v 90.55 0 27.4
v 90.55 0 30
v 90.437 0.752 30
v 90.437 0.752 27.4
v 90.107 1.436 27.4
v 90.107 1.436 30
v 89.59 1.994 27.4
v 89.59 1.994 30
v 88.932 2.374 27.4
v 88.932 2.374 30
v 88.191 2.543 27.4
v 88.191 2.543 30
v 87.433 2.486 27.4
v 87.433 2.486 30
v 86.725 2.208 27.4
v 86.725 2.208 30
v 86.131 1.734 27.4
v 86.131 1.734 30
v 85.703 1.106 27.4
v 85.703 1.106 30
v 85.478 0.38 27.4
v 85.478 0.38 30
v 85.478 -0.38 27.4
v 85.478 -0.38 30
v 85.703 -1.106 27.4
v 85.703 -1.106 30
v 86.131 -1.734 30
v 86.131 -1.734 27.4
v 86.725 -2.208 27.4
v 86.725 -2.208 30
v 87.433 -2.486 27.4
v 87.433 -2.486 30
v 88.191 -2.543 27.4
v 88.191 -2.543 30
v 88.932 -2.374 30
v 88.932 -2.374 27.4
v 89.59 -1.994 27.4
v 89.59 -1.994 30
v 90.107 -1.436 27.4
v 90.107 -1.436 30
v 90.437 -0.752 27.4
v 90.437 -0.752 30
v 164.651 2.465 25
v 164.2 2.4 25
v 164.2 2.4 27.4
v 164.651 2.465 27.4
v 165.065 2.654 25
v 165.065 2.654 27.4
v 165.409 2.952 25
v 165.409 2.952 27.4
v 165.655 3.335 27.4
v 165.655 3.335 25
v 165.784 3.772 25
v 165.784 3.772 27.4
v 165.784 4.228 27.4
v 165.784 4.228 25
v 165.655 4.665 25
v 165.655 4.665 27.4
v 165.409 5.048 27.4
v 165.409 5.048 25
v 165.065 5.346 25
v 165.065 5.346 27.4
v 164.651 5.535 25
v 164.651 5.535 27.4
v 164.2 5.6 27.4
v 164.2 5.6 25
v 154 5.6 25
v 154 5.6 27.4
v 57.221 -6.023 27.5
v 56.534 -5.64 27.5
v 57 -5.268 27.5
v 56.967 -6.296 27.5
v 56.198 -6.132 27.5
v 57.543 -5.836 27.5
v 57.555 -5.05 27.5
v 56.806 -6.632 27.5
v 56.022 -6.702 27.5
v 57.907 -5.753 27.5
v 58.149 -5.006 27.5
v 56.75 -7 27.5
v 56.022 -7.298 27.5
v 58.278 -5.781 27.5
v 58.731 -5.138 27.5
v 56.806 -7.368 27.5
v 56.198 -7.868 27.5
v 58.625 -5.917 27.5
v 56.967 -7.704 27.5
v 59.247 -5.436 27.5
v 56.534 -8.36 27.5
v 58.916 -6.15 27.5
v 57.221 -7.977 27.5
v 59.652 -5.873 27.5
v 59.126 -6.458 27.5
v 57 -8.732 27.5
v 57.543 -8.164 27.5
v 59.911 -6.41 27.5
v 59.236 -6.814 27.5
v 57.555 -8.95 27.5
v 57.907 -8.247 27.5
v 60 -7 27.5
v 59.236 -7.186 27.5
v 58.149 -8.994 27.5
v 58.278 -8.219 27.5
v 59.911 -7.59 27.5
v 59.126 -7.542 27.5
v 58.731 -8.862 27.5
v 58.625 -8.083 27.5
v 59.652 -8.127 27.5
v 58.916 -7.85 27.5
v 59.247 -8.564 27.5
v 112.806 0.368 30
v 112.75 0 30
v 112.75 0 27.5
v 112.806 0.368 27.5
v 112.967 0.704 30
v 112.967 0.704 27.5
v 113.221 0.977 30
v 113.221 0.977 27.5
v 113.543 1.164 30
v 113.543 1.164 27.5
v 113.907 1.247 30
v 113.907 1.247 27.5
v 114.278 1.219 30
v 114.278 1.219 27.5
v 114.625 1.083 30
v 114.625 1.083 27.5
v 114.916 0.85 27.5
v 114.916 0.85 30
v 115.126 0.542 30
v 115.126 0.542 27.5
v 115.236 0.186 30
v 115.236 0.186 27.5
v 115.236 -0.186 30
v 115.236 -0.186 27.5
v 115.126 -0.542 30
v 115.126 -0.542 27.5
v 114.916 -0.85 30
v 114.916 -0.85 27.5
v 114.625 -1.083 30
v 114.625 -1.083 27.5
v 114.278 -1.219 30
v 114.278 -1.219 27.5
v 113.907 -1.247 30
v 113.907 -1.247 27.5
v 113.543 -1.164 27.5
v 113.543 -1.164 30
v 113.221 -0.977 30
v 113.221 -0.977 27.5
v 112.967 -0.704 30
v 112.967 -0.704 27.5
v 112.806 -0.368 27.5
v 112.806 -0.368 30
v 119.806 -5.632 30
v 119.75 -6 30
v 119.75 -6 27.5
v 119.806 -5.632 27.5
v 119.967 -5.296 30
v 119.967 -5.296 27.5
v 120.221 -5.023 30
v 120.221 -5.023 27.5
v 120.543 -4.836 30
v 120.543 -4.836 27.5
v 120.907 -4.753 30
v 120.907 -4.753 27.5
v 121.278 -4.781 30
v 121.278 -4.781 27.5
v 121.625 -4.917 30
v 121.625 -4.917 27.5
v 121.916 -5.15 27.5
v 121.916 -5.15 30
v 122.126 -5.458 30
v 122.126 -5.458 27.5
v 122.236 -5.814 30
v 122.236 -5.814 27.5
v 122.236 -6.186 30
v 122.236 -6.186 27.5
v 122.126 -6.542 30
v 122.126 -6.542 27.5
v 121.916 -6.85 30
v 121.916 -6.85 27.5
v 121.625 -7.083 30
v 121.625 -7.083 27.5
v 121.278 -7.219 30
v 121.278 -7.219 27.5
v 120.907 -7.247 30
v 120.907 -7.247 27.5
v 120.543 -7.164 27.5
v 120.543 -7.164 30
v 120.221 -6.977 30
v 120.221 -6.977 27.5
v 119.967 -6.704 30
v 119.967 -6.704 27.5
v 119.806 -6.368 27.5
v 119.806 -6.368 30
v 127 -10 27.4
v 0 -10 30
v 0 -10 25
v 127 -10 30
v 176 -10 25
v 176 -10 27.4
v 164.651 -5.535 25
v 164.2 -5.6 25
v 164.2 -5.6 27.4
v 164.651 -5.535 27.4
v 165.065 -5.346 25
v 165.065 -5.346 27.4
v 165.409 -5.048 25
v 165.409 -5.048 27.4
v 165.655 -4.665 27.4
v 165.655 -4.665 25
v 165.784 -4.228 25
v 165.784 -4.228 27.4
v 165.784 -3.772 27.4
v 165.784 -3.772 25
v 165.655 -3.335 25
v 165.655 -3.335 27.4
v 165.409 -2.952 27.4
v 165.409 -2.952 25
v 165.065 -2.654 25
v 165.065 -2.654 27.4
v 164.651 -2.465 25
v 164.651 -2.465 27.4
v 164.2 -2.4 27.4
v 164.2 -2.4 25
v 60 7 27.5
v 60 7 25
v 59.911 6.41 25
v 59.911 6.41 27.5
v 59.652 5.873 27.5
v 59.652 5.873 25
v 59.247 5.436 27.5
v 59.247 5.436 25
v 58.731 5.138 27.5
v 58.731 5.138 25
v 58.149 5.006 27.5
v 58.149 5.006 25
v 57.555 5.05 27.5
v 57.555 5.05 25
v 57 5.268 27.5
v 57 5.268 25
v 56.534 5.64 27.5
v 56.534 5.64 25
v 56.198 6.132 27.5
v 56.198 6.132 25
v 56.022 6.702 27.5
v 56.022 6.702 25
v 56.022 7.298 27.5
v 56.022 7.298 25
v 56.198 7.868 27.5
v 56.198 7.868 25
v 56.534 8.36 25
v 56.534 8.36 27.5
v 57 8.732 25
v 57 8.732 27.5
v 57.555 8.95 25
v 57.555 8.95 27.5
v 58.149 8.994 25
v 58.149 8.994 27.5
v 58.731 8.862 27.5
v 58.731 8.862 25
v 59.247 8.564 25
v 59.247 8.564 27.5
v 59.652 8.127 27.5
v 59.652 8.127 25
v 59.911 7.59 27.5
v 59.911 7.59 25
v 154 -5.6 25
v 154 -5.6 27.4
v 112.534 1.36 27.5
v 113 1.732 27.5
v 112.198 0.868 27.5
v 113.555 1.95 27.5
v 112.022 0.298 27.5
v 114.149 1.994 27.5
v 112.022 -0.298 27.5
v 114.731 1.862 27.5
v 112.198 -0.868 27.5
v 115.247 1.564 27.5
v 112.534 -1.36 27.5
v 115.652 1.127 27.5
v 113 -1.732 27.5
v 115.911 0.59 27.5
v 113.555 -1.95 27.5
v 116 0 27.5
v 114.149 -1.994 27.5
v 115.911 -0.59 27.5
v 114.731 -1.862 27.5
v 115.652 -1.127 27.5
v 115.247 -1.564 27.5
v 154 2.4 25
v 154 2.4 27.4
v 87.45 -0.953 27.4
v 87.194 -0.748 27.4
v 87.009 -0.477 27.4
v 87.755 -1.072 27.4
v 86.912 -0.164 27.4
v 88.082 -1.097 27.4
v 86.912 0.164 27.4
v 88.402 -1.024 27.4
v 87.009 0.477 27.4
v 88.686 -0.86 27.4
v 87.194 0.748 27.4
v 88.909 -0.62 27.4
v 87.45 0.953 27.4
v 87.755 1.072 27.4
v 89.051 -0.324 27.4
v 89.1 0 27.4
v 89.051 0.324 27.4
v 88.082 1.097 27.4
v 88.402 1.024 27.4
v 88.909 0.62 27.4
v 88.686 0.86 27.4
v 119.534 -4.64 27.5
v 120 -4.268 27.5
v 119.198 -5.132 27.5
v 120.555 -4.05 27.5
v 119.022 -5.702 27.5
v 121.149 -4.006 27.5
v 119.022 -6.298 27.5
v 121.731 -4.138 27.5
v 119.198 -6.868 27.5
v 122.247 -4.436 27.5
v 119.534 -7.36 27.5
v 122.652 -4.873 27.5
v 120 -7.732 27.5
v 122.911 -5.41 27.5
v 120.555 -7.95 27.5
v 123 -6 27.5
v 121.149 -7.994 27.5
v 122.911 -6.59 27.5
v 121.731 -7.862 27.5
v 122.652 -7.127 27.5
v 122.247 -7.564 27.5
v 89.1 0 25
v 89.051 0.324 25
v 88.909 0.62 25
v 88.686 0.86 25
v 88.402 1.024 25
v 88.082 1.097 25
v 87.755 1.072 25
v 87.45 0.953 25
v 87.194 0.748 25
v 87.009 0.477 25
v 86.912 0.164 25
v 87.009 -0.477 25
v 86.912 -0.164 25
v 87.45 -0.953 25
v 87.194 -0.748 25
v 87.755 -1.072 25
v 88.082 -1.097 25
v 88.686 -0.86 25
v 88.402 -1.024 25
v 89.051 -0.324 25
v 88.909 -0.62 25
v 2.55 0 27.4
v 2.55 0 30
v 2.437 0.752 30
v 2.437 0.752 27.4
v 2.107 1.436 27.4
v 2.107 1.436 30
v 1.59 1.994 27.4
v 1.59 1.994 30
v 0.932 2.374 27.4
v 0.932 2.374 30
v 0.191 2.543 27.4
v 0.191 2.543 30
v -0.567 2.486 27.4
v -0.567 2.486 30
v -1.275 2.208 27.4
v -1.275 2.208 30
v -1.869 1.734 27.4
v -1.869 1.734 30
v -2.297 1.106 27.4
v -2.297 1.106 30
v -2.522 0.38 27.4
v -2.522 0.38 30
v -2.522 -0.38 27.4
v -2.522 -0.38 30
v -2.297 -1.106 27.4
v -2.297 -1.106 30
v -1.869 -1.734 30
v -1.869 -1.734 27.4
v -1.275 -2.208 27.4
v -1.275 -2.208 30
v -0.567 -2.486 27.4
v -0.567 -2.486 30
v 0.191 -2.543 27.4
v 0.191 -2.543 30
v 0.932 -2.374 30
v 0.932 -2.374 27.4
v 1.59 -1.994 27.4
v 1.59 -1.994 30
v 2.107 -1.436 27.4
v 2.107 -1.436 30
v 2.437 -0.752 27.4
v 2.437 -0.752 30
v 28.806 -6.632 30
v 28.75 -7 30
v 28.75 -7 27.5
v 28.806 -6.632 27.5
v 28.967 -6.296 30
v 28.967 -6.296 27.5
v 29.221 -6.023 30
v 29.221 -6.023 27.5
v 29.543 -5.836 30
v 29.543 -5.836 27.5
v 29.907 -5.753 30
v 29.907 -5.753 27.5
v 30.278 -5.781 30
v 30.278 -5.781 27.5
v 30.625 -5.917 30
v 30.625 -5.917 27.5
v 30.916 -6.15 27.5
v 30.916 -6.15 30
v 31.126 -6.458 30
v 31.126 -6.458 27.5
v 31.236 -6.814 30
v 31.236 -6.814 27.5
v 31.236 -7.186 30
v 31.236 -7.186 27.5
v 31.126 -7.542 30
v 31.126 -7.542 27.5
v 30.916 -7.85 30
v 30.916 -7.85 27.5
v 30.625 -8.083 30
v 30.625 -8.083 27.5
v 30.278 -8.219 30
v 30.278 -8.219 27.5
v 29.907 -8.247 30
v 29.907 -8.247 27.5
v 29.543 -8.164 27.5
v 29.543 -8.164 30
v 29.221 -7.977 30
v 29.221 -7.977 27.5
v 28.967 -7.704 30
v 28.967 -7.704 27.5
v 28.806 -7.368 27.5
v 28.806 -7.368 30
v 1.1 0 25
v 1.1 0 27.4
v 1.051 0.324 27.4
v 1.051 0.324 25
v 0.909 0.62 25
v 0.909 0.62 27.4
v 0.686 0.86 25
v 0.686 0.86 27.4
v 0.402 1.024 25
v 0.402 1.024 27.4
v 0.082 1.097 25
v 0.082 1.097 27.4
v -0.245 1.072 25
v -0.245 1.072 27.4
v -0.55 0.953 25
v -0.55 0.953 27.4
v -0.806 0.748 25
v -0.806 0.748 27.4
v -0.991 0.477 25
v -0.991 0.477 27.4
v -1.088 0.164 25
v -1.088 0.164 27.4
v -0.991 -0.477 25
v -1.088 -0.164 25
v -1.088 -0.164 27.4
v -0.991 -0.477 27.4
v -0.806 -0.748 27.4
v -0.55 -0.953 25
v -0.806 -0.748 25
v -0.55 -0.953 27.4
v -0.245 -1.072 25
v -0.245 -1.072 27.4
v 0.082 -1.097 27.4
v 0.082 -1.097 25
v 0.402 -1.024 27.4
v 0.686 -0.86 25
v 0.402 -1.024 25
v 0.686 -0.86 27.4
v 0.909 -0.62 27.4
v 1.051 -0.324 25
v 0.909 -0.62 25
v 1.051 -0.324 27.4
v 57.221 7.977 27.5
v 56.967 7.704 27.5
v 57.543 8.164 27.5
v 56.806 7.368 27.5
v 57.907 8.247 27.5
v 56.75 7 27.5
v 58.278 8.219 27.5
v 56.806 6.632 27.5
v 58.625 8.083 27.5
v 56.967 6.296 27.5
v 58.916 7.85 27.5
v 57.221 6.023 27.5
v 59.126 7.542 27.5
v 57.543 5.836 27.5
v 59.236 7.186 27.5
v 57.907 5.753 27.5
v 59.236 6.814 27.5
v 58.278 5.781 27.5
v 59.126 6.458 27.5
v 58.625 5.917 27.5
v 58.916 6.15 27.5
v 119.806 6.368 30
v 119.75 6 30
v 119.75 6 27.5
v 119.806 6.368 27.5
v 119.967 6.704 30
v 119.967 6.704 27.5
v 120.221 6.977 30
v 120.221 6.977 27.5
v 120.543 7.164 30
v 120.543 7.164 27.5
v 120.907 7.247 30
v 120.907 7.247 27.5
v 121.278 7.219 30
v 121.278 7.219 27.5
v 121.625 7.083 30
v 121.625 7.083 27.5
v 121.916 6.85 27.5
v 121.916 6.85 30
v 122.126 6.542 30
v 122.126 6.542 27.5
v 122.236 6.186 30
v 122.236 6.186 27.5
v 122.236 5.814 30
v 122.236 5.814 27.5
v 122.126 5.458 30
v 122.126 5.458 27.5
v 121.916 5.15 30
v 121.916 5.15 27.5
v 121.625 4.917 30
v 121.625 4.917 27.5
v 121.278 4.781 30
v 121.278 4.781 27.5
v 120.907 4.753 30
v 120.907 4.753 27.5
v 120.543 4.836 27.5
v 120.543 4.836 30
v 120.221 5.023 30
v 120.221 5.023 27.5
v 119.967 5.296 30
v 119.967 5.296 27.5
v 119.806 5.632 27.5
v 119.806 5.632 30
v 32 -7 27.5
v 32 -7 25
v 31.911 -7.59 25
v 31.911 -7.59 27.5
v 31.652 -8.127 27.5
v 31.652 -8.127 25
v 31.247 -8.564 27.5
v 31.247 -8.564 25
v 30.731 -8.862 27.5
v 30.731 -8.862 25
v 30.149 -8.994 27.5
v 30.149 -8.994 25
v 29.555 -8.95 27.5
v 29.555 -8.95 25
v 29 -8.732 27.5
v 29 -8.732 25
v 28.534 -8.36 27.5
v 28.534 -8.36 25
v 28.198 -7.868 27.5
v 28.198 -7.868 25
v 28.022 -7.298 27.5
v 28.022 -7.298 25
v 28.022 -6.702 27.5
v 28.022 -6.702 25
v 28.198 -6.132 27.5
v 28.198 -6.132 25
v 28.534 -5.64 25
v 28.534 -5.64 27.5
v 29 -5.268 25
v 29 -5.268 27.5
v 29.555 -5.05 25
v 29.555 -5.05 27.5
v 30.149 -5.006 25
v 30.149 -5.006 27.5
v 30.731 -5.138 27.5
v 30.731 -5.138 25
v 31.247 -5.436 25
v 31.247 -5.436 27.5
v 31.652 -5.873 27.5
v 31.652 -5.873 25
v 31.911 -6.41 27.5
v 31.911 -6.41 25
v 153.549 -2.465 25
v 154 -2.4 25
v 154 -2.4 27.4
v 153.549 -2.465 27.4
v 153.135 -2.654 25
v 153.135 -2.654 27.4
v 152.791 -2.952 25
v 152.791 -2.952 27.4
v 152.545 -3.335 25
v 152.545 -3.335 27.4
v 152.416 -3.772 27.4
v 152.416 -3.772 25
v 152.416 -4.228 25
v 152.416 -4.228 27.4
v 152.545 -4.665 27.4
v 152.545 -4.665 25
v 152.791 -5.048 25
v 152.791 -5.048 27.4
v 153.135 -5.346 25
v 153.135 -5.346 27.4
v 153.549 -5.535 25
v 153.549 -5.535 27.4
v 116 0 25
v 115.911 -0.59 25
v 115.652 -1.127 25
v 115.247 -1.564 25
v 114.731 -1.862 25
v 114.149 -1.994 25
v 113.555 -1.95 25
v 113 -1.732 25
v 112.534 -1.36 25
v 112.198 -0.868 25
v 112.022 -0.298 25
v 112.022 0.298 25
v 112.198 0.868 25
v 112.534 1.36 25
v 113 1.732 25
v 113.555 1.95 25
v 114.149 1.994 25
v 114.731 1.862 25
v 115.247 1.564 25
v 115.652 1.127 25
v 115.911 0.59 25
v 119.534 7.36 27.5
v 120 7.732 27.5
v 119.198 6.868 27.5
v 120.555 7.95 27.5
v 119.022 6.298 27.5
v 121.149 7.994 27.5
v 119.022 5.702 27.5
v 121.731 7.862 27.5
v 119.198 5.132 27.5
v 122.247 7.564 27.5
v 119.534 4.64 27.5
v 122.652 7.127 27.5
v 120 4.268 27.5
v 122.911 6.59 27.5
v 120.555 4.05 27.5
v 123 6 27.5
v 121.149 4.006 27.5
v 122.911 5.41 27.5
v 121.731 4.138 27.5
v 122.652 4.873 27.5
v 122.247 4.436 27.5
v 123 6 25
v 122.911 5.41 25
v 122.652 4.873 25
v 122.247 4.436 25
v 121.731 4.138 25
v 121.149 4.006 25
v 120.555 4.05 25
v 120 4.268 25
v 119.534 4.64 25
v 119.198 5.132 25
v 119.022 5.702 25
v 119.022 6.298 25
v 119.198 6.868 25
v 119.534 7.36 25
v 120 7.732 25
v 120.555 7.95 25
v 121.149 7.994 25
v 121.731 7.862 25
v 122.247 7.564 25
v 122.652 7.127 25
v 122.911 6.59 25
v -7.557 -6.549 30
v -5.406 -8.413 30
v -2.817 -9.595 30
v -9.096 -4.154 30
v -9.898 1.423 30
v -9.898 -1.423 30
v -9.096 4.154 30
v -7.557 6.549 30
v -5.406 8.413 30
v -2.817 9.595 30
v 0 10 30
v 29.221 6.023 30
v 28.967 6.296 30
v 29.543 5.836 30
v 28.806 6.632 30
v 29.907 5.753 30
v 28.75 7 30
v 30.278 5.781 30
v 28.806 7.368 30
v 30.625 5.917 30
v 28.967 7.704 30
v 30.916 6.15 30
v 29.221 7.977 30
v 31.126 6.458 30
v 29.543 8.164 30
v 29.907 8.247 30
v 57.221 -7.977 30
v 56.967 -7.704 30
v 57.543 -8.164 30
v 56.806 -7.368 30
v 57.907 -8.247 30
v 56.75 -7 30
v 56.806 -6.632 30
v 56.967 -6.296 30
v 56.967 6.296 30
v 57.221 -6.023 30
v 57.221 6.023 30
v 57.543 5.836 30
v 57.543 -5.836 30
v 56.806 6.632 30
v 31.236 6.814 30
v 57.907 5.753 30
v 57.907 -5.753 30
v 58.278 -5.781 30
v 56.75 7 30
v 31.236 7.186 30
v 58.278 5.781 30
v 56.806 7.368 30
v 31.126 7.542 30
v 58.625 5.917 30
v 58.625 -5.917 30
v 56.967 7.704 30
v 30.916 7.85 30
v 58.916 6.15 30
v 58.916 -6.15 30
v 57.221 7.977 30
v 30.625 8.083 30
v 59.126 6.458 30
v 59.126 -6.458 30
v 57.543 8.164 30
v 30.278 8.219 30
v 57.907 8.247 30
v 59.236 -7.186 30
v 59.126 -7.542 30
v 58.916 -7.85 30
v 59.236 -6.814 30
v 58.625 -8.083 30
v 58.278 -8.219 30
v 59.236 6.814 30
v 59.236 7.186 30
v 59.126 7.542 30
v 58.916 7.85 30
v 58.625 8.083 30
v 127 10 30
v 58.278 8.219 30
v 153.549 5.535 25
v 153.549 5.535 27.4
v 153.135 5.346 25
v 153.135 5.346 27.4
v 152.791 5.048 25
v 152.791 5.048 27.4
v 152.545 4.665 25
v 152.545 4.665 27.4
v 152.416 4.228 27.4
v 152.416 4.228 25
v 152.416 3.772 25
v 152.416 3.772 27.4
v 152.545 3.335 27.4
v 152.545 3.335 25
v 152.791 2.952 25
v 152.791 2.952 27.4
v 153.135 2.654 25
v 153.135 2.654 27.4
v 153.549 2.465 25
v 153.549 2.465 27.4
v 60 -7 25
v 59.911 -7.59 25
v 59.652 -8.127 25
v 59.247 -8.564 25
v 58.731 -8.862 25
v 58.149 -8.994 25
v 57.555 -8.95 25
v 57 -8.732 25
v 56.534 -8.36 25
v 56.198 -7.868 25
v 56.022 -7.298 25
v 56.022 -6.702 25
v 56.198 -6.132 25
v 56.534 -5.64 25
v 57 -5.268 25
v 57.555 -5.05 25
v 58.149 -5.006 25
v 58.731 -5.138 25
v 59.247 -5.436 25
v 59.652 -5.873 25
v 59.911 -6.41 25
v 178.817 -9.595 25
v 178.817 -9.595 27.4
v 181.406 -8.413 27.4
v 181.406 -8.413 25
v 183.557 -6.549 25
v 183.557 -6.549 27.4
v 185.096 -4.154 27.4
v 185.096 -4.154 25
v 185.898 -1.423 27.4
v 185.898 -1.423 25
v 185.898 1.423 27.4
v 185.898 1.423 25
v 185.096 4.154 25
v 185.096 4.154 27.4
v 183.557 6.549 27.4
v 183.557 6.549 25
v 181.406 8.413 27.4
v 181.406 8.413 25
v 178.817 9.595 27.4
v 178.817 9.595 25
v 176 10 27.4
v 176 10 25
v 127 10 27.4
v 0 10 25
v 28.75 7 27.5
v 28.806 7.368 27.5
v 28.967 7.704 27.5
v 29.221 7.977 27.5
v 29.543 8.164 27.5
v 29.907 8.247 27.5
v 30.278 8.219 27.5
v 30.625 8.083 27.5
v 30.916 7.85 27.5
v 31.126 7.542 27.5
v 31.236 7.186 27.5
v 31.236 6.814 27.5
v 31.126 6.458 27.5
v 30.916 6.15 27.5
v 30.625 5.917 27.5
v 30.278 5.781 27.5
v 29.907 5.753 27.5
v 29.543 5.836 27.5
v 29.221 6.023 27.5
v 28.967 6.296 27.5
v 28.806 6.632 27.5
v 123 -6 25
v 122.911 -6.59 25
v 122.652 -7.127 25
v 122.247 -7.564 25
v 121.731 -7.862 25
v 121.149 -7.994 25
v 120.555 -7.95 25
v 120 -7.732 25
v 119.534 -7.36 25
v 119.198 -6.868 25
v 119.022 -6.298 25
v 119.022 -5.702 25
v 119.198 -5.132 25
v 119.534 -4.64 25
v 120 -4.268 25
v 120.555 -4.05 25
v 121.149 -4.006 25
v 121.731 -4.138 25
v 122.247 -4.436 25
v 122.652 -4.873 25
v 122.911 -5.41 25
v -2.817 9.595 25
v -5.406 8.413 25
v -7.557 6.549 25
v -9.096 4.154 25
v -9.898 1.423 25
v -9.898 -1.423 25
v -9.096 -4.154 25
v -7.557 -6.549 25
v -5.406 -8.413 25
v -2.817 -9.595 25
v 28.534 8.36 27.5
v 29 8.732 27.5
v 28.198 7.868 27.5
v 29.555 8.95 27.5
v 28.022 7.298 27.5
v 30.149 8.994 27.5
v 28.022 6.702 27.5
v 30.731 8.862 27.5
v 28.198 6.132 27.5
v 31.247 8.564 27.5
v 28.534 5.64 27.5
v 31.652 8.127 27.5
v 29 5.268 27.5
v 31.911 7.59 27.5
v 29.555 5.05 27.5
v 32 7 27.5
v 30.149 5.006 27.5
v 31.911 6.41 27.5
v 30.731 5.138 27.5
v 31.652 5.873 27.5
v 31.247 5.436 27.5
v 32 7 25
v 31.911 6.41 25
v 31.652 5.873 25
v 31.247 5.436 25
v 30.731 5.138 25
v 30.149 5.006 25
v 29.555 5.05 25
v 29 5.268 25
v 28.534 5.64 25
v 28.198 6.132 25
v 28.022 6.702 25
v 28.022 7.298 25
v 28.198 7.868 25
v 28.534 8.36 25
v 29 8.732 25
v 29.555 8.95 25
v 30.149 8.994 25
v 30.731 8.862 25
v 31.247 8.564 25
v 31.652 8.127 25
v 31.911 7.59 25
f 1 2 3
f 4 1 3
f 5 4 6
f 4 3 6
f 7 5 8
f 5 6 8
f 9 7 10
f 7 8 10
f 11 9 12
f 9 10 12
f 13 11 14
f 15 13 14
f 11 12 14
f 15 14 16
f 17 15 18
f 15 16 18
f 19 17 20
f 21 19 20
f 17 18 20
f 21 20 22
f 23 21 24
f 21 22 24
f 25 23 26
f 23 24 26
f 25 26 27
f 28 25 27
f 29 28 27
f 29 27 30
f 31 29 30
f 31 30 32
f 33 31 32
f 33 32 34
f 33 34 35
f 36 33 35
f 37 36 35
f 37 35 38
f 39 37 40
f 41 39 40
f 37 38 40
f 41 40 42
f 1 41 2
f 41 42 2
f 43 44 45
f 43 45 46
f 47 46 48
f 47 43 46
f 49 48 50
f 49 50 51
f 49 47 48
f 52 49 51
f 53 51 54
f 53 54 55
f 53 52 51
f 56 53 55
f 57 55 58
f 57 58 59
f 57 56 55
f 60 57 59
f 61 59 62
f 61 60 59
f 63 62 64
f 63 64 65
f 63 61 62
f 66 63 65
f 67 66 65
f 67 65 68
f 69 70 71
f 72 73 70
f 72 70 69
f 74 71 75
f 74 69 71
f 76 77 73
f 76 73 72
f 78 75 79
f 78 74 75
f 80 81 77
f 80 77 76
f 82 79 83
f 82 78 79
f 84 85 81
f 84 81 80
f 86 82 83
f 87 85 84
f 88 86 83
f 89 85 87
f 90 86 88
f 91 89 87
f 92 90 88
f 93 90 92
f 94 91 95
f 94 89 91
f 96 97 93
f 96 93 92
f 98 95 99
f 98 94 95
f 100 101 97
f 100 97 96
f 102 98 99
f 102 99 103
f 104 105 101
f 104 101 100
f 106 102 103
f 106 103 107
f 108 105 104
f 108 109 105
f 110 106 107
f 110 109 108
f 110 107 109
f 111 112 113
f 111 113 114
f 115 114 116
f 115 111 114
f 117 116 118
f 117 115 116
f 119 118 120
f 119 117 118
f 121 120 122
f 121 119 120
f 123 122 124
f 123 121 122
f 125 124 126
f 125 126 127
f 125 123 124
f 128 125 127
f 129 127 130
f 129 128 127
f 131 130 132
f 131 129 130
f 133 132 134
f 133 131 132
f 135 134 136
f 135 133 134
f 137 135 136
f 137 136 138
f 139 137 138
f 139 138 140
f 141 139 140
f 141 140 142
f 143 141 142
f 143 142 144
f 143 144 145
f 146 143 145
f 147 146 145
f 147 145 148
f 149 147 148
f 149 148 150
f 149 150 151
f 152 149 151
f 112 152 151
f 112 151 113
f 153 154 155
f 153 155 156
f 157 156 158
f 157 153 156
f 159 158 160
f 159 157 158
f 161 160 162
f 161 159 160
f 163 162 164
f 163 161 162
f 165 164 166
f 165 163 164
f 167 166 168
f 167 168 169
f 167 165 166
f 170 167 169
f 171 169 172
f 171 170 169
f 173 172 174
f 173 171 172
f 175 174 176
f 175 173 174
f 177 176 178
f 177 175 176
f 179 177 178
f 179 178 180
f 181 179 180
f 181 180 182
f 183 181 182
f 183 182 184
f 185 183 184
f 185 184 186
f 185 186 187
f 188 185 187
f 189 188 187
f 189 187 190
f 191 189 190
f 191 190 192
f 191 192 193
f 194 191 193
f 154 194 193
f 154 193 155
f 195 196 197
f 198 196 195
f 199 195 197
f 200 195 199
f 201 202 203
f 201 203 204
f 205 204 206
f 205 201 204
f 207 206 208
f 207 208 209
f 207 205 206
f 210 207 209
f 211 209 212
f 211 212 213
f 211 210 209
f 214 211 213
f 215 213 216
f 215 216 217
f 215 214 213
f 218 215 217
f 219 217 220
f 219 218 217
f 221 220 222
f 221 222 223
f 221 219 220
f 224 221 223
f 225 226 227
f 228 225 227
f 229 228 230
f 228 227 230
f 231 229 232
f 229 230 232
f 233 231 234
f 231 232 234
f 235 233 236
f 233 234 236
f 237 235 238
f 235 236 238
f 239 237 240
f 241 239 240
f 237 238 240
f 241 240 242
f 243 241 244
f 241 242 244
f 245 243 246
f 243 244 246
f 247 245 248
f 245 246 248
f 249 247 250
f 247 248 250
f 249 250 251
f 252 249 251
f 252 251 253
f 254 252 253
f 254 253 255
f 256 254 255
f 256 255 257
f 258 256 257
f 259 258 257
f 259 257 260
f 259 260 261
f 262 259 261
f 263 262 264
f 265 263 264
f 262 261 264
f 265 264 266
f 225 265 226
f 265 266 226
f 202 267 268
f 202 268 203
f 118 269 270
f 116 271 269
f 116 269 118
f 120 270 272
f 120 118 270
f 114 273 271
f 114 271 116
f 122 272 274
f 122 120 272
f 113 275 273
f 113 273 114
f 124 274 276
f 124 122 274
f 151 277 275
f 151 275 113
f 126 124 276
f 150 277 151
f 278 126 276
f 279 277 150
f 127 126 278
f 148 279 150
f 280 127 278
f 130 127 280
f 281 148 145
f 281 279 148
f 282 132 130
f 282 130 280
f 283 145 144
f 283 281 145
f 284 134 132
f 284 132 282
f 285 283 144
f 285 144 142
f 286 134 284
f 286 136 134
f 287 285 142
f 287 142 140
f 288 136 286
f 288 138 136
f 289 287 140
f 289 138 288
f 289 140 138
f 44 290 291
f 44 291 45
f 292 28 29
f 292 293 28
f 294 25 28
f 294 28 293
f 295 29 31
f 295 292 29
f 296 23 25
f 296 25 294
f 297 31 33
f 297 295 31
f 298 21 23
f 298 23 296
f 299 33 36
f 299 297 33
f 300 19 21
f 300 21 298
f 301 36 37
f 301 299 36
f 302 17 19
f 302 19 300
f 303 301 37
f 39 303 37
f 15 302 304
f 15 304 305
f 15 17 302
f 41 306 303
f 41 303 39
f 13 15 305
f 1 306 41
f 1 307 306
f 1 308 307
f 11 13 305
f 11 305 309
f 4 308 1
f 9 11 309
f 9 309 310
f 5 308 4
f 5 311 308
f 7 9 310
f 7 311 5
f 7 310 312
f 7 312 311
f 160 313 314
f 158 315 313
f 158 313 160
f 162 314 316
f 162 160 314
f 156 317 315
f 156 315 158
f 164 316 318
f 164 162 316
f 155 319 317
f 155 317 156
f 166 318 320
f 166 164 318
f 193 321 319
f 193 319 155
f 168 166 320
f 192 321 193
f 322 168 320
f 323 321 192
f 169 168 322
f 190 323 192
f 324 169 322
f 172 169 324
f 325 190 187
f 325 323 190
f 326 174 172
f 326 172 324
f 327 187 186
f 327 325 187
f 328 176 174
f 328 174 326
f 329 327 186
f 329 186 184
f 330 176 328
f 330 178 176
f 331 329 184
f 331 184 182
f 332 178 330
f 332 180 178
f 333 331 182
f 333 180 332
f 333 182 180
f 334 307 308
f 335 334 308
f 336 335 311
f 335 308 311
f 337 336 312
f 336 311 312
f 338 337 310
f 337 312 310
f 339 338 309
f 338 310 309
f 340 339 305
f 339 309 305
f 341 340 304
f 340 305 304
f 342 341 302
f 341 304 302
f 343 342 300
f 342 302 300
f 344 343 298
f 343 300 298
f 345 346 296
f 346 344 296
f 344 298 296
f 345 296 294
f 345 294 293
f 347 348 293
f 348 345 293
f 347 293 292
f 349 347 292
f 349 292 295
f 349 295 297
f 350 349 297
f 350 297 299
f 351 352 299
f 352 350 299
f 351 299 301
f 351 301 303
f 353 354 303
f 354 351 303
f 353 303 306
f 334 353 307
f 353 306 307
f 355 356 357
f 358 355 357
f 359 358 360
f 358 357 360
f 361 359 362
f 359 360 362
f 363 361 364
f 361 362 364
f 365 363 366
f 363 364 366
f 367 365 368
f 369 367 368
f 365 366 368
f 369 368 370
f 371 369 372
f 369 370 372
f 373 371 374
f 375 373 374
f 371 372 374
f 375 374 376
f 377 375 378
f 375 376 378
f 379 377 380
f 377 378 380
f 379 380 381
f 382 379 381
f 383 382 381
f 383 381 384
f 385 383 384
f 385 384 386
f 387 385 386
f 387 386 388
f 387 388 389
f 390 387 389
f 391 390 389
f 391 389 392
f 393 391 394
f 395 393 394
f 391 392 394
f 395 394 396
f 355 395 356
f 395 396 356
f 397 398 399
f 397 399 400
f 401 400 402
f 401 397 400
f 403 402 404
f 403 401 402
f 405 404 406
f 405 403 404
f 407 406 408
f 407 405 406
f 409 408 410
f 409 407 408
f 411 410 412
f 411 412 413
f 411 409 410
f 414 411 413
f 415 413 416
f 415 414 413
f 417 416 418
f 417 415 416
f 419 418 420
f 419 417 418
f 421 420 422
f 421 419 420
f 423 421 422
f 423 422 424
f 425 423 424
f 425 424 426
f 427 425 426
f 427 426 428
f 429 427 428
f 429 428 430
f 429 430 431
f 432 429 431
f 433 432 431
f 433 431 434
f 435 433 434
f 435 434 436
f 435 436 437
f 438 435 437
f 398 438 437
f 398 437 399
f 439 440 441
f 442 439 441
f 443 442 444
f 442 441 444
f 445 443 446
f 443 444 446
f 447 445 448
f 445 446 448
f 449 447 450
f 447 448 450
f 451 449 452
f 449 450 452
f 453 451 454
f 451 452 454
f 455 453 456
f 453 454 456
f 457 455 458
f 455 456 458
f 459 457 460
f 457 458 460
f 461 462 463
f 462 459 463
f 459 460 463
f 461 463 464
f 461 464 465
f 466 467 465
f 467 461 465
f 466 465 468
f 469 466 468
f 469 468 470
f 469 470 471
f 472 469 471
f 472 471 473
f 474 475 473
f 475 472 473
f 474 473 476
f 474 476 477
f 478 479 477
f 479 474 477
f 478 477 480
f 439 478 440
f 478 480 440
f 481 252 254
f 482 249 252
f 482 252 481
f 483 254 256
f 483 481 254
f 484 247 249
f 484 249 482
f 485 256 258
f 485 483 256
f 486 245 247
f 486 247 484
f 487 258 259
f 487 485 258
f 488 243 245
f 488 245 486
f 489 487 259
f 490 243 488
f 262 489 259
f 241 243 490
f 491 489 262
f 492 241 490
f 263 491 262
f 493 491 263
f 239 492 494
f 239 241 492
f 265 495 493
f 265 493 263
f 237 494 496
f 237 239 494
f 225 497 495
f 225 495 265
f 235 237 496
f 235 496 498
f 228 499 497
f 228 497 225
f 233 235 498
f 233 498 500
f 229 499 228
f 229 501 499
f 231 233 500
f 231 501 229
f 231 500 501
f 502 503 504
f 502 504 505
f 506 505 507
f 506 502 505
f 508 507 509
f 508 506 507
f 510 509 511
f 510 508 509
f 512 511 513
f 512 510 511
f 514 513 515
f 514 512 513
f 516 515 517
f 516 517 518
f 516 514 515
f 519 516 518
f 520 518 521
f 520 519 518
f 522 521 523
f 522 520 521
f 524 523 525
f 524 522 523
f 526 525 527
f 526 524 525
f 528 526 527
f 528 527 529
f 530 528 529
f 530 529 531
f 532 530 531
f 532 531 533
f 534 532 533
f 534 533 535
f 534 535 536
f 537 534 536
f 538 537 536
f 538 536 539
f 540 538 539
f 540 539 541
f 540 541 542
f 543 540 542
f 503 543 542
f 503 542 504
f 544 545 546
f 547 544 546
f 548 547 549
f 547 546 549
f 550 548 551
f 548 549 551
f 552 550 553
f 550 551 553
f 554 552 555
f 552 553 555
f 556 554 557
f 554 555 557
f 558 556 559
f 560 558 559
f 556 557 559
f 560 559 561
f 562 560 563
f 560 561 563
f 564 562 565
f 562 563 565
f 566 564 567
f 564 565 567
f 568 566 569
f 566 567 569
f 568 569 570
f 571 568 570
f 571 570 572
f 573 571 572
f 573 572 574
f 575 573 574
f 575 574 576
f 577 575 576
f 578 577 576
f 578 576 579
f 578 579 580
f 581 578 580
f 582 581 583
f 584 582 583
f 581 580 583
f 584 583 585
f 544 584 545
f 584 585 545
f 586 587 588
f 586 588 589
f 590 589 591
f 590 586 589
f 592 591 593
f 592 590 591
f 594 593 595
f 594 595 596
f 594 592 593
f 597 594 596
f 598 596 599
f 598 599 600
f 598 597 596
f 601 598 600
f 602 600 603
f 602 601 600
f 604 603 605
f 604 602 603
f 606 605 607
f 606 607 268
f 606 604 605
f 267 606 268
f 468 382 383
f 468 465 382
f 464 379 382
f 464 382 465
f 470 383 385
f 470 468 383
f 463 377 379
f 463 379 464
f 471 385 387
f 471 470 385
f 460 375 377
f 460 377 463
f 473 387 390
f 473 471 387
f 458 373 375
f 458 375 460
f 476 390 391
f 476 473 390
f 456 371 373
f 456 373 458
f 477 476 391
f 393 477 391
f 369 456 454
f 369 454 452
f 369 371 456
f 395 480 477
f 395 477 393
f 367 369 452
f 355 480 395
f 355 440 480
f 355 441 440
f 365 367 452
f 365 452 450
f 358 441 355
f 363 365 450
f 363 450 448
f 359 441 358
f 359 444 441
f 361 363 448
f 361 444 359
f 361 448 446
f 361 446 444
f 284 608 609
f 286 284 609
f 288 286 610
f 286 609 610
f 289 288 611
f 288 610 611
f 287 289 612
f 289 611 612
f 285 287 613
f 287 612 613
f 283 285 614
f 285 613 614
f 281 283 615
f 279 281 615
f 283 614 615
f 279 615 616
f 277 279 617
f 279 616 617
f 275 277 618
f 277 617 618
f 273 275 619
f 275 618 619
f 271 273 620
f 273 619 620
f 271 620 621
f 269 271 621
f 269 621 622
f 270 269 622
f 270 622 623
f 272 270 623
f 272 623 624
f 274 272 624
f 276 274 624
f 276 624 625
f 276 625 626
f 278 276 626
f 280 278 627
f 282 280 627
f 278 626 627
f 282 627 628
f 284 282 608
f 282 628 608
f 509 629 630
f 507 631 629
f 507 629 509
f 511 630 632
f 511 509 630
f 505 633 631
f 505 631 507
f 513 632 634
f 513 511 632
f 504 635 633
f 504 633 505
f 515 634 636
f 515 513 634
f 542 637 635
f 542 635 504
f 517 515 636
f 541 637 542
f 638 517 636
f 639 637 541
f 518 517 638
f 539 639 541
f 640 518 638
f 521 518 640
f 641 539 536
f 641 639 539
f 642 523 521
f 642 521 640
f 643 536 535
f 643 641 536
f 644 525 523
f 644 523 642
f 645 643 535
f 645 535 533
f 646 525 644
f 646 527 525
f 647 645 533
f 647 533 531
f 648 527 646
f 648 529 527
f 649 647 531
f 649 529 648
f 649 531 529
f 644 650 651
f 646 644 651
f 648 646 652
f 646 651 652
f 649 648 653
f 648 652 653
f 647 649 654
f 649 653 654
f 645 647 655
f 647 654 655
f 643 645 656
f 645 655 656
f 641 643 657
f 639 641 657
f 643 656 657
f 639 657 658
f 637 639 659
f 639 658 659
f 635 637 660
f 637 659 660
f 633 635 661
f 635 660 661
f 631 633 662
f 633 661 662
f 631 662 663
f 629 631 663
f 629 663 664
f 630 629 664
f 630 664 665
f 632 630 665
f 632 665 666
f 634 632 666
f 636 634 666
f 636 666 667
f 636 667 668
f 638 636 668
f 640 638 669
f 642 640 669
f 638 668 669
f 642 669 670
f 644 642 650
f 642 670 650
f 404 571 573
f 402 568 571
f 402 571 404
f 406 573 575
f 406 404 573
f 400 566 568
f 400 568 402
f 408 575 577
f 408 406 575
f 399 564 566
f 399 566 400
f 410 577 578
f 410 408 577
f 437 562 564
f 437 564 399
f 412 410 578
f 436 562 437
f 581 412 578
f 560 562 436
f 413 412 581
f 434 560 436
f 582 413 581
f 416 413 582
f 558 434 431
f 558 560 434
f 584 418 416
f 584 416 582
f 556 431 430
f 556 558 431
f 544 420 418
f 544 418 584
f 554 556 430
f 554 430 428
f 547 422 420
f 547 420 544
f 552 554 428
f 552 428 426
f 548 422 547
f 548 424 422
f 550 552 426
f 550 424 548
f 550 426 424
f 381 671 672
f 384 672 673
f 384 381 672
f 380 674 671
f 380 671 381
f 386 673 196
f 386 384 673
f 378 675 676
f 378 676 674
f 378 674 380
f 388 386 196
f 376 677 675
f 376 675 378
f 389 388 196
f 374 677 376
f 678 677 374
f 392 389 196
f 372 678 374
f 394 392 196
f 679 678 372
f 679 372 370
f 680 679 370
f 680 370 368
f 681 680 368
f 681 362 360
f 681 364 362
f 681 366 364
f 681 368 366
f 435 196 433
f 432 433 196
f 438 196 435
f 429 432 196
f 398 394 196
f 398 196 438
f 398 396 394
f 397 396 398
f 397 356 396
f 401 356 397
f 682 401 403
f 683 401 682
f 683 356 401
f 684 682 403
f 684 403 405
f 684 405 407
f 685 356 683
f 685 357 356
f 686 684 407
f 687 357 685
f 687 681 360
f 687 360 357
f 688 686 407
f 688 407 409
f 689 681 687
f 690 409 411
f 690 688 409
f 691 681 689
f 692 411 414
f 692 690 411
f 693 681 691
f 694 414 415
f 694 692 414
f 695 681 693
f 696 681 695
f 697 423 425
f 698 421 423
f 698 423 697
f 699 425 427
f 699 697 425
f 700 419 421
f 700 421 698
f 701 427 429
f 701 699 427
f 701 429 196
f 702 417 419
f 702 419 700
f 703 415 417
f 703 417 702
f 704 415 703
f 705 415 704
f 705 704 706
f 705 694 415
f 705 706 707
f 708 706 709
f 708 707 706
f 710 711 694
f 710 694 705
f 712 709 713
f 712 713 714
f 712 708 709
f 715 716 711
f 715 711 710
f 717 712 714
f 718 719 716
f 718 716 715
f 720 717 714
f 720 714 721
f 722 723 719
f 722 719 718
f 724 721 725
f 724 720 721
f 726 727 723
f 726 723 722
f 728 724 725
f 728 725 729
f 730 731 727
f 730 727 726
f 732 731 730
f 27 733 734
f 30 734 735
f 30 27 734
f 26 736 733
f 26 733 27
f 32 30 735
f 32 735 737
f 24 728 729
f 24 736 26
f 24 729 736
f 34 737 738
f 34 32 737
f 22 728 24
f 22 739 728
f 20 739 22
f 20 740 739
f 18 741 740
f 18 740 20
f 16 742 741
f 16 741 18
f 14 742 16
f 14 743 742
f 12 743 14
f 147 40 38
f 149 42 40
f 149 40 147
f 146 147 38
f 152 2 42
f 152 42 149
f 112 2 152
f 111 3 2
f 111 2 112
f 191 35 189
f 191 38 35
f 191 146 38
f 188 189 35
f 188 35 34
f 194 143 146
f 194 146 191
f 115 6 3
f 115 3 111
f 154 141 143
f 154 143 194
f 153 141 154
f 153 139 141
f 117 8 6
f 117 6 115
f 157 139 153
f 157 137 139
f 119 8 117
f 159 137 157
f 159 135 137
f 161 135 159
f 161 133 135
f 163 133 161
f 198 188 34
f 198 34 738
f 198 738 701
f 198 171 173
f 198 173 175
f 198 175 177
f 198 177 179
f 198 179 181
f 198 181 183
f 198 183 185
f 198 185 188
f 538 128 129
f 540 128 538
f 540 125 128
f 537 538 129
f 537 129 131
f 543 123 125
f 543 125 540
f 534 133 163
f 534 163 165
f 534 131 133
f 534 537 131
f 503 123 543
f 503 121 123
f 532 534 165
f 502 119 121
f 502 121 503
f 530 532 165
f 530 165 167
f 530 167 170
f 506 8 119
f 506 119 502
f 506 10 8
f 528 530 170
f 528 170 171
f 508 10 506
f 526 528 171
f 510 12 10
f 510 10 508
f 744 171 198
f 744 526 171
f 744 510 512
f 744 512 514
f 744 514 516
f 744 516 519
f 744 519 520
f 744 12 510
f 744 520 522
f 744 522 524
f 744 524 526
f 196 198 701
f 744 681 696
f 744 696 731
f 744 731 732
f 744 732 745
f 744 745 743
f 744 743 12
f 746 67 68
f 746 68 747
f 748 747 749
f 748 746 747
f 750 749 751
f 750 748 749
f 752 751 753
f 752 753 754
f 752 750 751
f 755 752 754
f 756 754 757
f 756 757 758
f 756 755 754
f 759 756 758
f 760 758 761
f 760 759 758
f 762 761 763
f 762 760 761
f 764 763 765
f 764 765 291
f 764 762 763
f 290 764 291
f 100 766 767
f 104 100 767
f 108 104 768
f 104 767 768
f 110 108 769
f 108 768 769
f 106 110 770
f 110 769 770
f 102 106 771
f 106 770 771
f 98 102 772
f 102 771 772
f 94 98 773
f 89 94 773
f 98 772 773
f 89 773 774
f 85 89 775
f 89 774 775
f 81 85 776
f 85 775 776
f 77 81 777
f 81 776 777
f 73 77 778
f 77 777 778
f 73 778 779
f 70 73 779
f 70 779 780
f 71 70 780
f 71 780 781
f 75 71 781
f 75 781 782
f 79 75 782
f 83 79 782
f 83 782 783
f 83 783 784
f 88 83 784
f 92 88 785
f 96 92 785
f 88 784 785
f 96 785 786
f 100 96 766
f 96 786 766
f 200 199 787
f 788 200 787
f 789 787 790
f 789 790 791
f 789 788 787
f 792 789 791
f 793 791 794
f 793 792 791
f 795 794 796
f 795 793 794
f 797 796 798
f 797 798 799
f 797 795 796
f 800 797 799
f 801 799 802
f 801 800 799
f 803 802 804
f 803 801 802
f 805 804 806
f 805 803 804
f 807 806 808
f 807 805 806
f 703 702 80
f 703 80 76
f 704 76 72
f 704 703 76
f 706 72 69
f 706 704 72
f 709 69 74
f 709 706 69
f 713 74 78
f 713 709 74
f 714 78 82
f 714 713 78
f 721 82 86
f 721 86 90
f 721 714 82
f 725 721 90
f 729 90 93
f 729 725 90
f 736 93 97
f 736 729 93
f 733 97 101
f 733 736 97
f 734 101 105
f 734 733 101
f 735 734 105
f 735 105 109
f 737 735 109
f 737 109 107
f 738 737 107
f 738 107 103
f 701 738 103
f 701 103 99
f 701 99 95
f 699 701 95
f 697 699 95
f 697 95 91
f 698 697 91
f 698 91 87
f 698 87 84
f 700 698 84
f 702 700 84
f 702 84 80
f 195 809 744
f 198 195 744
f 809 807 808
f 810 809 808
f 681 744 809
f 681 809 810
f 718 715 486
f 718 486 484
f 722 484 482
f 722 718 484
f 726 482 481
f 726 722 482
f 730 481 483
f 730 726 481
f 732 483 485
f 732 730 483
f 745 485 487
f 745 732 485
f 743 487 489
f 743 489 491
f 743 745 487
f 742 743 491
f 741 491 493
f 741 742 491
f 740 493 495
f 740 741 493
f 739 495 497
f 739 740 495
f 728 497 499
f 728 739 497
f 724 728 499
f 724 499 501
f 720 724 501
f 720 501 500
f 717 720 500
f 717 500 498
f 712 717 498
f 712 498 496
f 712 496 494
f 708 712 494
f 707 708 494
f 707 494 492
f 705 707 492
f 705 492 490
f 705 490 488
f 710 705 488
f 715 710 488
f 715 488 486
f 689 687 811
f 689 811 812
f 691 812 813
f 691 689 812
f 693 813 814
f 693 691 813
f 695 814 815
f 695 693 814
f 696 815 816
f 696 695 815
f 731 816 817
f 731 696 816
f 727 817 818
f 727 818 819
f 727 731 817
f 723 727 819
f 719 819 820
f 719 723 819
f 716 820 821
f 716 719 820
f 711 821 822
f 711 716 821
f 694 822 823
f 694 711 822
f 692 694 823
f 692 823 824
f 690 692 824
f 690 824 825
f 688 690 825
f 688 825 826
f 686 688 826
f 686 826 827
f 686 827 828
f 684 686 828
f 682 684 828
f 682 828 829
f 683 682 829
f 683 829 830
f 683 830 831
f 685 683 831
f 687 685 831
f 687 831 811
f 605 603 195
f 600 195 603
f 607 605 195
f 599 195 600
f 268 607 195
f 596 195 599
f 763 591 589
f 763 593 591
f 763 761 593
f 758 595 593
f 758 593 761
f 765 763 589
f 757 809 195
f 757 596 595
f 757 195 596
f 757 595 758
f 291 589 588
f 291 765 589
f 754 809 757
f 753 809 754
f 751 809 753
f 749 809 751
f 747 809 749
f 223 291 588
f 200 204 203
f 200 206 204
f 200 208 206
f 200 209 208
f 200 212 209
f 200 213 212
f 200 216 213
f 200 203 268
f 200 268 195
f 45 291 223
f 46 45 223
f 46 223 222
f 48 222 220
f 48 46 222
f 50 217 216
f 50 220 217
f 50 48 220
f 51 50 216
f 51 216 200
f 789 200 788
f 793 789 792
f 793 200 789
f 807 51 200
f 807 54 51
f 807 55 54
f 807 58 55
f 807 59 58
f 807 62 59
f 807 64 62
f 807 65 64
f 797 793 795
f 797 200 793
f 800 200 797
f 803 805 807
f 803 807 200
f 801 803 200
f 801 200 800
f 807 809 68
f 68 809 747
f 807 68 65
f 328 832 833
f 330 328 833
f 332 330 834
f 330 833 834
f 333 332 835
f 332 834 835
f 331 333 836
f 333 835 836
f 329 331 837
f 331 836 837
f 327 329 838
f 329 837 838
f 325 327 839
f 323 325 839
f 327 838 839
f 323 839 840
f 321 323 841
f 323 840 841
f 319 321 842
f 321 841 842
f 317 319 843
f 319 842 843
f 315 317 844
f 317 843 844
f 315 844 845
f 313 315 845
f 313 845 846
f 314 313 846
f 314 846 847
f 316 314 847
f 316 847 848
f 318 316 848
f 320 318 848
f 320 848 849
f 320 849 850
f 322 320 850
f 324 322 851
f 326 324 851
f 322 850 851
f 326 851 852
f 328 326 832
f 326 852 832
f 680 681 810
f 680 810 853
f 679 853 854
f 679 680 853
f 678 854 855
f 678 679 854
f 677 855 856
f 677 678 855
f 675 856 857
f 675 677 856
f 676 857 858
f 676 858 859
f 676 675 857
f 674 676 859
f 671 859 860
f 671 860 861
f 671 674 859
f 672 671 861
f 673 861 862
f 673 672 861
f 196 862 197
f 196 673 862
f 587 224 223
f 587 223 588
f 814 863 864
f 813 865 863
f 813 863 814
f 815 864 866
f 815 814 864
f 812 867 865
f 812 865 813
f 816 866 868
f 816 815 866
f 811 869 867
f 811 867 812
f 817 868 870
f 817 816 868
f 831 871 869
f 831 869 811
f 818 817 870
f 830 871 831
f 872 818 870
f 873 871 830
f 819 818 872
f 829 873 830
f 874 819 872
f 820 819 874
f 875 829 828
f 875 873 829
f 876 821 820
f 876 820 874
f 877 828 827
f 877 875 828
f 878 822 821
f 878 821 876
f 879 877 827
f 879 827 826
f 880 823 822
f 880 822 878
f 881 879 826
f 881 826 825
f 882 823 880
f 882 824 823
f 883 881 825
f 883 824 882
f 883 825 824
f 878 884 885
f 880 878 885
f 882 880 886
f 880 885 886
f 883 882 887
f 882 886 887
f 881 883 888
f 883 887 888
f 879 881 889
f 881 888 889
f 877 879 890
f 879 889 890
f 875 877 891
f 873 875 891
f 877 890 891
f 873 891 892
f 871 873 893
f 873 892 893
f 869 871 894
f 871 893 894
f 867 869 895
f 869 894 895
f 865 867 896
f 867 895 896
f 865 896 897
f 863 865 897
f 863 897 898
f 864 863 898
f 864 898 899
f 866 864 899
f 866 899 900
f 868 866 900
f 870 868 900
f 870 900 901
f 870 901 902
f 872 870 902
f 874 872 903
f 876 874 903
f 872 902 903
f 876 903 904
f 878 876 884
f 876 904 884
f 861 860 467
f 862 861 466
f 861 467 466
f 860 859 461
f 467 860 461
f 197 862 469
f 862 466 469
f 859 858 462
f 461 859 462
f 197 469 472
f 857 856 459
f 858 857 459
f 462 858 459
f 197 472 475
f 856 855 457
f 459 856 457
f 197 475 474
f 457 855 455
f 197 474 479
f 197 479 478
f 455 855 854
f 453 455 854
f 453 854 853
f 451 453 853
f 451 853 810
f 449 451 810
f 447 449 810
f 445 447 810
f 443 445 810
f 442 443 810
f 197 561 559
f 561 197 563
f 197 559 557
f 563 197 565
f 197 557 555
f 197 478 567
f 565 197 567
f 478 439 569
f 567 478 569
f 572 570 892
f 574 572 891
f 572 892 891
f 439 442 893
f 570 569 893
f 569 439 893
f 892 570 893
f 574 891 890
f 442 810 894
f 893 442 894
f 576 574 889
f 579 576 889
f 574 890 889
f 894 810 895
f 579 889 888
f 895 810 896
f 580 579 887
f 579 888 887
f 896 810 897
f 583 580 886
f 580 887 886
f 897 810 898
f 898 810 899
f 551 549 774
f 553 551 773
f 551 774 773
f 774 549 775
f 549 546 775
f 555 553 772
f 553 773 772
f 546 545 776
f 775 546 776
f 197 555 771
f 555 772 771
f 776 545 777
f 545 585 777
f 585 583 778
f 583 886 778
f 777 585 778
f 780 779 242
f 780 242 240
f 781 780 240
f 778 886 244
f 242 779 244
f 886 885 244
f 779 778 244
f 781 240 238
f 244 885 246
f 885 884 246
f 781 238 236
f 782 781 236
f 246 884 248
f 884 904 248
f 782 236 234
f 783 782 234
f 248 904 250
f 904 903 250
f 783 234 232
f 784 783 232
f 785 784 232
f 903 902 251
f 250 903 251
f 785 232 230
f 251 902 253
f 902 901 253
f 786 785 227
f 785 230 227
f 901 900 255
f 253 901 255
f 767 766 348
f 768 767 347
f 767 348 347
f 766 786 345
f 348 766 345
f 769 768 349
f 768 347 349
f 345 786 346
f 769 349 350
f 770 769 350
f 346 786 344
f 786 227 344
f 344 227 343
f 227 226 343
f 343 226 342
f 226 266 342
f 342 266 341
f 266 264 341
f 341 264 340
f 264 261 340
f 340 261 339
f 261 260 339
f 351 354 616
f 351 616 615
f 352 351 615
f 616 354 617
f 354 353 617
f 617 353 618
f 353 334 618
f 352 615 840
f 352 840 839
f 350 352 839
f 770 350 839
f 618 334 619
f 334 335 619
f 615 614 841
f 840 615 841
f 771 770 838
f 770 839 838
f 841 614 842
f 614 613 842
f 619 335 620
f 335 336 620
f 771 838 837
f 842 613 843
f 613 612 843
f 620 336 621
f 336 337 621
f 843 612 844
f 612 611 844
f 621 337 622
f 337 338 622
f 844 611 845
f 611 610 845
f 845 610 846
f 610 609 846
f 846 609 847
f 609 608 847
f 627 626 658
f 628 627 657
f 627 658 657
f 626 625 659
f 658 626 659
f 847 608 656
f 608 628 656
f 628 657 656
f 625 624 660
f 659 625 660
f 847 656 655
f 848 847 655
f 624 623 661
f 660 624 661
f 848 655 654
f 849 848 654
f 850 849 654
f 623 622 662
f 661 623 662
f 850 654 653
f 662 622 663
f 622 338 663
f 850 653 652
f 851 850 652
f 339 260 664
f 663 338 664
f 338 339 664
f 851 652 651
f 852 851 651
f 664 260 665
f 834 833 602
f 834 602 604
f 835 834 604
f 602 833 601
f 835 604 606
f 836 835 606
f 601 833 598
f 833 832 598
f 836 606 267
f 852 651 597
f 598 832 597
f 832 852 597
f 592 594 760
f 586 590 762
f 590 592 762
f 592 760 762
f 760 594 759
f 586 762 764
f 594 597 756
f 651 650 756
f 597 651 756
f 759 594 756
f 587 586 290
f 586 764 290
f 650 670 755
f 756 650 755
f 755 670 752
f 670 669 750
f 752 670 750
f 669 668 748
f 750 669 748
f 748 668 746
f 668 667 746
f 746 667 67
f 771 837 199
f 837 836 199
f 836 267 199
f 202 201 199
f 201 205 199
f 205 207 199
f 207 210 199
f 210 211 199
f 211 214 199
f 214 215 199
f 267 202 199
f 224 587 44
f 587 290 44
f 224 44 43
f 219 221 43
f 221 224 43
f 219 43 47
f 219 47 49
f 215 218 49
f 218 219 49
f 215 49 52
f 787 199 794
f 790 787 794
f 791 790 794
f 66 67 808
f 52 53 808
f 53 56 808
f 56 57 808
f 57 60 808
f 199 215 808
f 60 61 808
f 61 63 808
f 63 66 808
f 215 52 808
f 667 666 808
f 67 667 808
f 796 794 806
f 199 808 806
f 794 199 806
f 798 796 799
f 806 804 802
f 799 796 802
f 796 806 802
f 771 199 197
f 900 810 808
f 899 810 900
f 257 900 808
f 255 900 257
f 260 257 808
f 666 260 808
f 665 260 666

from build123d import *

# Parameters (mm, degrees)
EXTRUDE_1_DEPTH     = 5
SKETCH_1_3_R        = 1.1
CUT_EXTRUDE_2_DEPTH = 187.33571853
SKETCH_1_4_R        = 2.55
CUT_EXTRUDE_3_DEPTH = 2.6
SKETCH_2_R          = 1.25
CUT_EXTRUDE_4_DEPTH = 187.33571853
CUT_EXTRUDE_START   = -5
SKETCH_2_3_R        = 2
CUT_EXTRUDE_5_DEPTH = 2.5
SKETCH_3_W          = 59
SKETCH_3_H          = 2.6
CUT_EXTRUDE_6_DEPTH = 188.138985783
CUT_EXTRUDE_7_DEPTH = 187.33571853
SKETCH_5_W          = 276.925102881
SKETCH_5_H          = 124.694650206
CUT_EXTRUDE_8_DEPTH = 187.871613682


with BuildPart() as part:
    # 草图1 → 凸台-拉伸1 (new body)
    with BuildSketch(Plane.XY):
        with BuildLine():
            Line((0, -10), (176, -10))
            ThreePointArc((176, -10), (186, 0), (176, 10))
            Line((176, 10), (0, 10))
            ThreePointArc((0, 10), (-10, 0), (0, -10))
        make_face()
    extrude(amount=EXTRUDE_1_DEPTH)

    # 草图1<3> → 切除-拉伸2 (cut, through all)
    with BuildSketch(Plane.XY):
        with Locations((88, 0)):
            Circle(SKETCH_1_3_R)
        Circle(SKETCH_1_3_R)
    extrude(amount=CUT_EXTRUDE_2_DEPTH, mode=Mode.SUBTRACT)

    # 草图1<4> → 切除-拉伸3 (cut)
    with BuildSketch(Plane.XY):
        with Locations((88, 0)):
            Circle(SKETCH_1_4_R)
        Circle(SKETCH_1_4_R)
    extrude(amount=CUT_EXTRUDE_3_DEPTH, mode=Mode.SUBTRACT)

    # 草图2 → 切除-拉伸4 (cut, through all)
    with BuildSketch(Plane(origin=(0, 0, 0), x_dir=(-1, 0, 0), z_dir=(0, 0, -1))):
        with Locations((-121, -6)):
            Circle(SKETCH_2_R)
        with Locations((-121, 6)):
            Circle(SKETCH_2_R)
        with Locations((-114, 0)):
            Circle(SKETCH_2_R)
        with Locations((-58, 7)):
            Circle(SKETCH_2_R)
        with Locations((-30, 7)):
            Circle(SKETCH_2_R)
        with Locations((-58, -7)):
            Circle(SKETCH_2_R)
        with Locations((-30, -7)):
            Circle(SKETCH_2_R)
    extrude(amount=-CUT_EXTRUDE_4_DEPTH, mode=Mode.SUBTRACT)

    # 草图2<3> → 切除-拉伸5 (cut)
    with BuildSketch(Plane(origin=(0, 0, 0), x_dir=(-1, 0, 0), z_dir=(0, 0, -1)).offset(CUT_EXTRUDE_START)):
        with Locations(Location((-121, -6, 0), (0, 0, 180))):
            Circle(SKETCH_2_3_R)
        with Locations(Location((-121, 6, 0), (0, 0, 180))):
            Circle(SKETCH_2_3_R)
        with Locations(Location((-114, 0, 0), (0, 0, 180))):
            Circle(SKETCH_2_3_R)
        with Locations(Location((-58, 7, 0), (0, 0, 180))):
            Circle(SKETCH_2_3_R)
        with Locations(Location((-30, 7, 0), (0, 0, 180))):
            Circle(SKETCH_2_3_R)
        with Locations(Location((-58, -7, 0), (0, 0, 180))):
            Circle(SKETCH_2_3_R)
        with Locations(Location((-30, -7, 0), (0, 0, 180))):
            Circle(SKETCH_2_3_R)
    extrude(amount=CUT_EXTRUDE_5_DEPTH, mode=Mode.SUBTRACT)

    # 草图3 → 切除-拉伸6 (cut, through all)
    with BuildSketch(Plane(origin=(0, 10, 0), x_dir=(1, 0, 0), z_dir=(0, 1, 0))):
        with Locations((156.5, -1.3)):
            Rectangle(SKETCH_3_W, SKETCH_3_H)
    extrude(amount=-CUT_EXTRUDE_6_DEPTH, mode=Mode.SUBTRACT)

    # 草图4 → 切除-拉伸7 (cut, through all)
    with BuildSketch(Plane.XY.offset(5)):
        with BuildLine():
            Line((164.2, -2.4), (154, -2.4))
            ThreePointArc((154, -2.4), (152.4, -4), (154, -5.6))
            Line((154, -5.6), (164.2, -5.6))
            ThreePointArc((164.2, -5.6), (165.8, -4), (164.2, -2.4))
        make_face()
        with BuildLine():
            ThreePointArc((154, 5.6), (152.4, 4), (154, 2.4))
            Line((154, 2.4), (164.2, 2.4))
            ThreePointArc((164.2, 2.4), (165.8, 4), (164.2, 5.6))
            Line((164.2, 5.6), (154, 5.6))
        make_face()
    extrude(amount=-CUT_EXTRUDE_7_DEPTH, mode=Mode.SUBTRACT)


with BuildPart() as body_2:
    # 镜向2: mirrored copy
    add(part.part.mirror(Plane.XY.offset(15)))


with BuildPart() as part_1:
    add(part.part)

    # 草图5 → 切除-拉伸8 (cut, through all)
    with BuildSketch(Plane.XY.offset(15)):
        with Locations((84.530041153, -5.708641975)):
            Rectangle(SKETCH_5_W, SKETCH_5_H)
    extrude(amount=-CUT_EXTRUDE_8_DEPTH, mode=Mode.SUBTRACT)


solid = body_2.part
